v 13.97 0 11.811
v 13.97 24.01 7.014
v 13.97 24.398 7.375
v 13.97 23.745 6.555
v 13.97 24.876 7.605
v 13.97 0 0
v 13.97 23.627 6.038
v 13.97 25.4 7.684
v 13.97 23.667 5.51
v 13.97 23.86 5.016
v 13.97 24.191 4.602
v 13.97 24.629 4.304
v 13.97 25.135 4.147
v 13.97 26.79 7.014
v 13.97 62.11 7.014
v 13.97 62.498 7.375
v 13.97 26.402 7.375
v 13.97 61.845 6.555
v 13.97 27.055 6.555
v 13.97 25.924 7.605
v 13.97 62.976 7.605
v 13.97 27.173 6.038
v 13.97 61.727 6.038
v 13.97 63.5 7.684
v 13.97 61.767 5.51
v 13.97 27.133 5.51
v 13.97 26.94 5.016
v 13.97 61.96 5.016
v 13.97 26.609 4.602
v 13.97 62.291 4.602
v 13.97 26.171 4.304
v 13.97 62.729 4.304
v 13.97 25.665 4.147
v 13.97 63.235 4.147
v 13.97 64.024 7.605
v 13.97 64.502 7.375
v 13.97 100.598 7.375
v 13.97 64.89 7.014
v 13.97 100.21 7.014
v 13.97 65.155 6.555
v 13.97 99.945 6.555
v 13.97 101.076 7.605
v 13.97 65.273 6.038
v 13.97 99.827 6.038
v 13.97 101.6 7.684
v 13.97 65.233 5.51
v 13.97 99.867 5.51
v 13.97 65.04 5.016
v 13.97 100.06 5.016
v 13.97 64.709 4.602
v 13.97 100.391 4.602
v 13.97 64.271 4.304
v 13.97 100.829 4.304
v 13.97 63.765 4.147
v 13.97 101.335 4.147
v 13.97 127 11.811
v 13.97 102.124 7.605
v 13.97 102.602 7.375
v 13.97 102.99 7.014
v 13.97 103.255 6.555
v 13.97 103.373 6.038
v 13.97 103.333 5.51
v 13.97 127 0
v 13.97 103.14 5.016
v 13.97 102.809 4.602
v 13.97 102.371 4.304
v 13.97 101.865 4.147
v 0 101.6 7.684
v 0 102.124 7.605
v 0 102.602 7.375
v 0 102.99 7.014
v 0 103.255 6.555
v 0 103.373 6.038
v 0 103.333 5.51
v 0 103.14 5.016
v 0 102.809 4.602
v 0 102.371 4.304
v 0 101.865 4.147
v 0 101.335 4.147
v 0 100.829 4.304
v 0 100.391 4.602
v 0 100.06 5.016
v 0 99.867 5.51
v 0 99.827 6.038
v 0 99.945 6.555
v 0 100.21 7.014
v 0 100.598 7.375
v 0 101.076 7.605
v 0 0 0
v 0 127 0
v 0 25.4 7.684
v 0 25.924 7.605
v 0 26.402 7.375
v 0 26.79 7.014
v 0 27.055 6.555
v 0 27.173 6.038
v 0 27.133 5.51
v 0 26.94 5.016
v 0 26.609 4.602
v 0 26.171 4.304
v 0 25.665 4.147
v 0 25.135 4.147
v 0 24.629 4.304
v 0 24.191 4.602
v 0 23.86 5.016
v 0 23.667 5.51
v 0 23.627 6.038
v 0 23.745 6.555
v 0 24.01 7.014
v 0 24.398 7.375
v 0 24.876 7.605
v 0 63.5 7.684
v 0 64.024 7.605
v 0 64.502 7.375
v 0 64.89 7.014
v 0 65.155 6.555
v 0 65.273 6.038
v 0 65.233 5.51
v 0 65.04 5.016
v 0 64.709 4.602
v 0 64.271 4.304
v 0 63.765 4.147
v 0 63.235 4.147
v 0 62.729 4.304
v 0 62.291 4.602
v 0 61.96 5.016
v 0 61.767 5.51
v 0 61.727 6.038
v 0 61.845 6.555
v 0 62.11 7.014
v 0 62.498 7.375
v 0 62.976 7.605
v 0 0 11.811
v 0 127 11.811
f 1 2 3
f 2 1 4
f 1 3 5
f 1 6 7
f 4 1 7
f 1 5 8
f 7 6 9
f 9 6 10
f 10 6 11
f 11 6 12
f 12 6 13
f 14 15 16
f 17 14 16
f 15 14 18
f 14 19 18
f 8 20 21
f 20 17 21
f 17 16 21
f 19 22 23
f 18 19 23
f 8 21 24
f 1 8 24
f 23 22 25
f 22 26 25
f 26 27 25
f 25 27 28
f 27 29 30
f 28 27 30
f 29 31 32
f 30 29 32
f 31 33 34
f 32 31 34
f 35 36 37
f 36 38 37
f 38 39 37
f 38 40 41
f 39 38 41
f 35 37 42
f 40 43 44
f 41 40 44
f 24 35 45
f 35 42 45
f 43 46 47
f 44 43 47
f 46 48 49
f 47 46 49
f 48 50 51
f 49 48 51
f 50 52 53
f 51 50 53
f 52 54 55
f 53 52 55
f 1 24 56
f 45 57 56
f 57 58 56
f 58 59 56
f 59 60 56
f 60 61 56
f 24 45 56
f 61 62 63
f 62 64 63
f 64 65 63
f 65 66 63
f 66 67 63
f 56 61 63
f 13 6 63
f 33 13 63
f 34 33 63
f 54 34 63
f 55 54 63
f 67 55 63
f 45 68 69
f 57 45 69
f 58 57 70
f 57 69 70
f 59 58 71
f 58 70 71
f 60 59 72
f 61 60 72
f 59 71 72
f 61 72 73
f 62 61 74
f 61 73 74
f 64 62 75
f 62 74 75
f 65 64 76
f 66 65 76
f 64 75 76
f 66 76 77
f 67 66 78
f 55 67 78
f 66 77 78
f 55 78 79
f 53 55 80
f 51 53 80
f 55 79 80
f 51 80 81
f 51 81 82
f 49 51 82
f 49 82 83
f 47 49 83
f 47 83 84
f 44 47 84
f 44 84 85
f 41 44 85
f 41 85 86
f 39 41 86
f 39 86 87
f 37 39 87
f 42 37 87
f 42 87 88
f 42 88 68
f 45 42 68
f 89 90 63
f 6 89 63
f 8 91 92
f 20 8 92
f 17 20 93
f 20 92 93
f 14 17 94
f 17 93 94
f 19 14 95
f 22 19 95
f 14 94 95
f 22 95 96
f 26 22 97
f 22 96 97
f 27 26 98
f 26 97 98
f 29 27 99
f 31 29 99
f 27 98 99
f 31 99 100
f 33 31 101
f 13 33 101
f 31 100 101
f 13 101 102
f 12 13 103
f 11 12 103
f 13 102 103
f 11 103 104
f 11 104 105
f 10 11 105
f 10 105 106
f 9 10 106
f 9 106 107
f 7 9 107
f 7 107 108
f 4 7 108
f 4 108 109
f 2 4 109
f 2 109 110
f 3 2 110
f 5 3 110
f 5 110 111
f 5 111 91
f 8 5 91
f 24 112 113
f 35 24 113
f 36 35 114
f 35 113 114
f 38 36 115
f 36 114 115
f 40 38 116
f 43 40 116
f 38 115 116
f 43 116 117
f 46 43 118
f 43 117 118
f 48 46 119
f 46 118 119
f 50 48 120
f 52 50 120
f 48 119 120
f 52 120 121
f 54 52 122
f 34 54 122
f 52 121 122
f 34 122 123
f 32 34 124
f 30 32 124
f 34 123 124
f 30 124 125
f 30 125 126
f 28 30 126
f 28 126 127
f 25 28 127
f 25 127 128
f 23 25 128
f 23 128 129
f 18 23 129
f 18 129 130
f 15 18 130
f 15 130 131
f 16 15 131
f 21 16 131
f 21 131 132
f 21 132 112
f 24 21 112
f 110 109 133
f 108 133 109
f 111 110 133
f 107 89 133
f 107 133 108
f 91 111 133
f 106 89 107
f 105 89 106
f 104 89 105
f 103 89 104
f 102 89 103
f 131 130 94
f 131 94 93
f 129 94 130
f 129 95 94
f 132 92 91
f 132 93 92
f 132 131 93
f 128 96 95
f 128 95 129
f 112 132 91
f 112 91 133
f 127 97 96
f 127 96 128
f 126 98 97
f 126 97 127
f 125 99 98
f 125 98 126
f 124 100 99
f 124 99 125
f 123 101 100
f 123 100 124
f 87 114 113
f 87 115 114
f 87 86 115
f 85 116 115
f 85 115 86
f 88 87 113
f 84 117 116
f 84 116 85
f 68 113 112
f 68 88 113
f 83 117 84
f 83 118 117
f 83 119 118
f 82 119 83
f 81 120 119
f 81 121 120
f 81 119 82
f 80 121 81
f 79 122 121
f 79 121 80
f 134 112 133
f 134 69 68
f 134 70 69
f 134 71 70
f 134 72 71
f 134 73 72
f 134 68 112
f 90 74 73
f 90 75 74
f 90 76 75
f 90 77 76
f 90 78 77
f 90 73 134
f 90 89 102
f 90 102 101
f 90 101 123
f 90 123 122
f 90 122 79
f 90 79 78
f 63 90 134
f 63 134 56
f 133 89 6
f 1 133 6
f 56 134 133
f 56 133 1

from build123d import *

# Parameters (mm, degrees)
SKETCH1_W           = 13.97
SKETCH1_H           = 127
BOSS_EXTRUDE1_DEPTH = 11.811
SKETCH2_R           = 1.778
CUT_EXTRUDE1_DEPTH  = 14.97


with BuildPart() as part:
    # Sketch1 → Boss-Extrude1 (new body)
    with BuildSketch(Plane.XY):
        with Locations((6.985, 63.5)):
            Rectangle(SKETCH1_W, SKETCH1_H)
    extrude(amount=BOSS_EXTRUDE1_DEPTH)

    # Sketch2 → Cut-Extrude1 (cut, through all)
    with BuildSketch(Plane.ZY):
        with Locations((5.9055, 101.6)):
            Circle(SKETCH2_R)
        with Locations((5.9055, 63.5)):
            Circle(SKETCH2_R)
        with Locations((5.9055, 25.4)):
            Circle(SKETCH2_R)
    extrude(amount=-CUT_EXTRUDE1_DEPTH, mode=Mode.SUBTRACT)


solid = part.part
